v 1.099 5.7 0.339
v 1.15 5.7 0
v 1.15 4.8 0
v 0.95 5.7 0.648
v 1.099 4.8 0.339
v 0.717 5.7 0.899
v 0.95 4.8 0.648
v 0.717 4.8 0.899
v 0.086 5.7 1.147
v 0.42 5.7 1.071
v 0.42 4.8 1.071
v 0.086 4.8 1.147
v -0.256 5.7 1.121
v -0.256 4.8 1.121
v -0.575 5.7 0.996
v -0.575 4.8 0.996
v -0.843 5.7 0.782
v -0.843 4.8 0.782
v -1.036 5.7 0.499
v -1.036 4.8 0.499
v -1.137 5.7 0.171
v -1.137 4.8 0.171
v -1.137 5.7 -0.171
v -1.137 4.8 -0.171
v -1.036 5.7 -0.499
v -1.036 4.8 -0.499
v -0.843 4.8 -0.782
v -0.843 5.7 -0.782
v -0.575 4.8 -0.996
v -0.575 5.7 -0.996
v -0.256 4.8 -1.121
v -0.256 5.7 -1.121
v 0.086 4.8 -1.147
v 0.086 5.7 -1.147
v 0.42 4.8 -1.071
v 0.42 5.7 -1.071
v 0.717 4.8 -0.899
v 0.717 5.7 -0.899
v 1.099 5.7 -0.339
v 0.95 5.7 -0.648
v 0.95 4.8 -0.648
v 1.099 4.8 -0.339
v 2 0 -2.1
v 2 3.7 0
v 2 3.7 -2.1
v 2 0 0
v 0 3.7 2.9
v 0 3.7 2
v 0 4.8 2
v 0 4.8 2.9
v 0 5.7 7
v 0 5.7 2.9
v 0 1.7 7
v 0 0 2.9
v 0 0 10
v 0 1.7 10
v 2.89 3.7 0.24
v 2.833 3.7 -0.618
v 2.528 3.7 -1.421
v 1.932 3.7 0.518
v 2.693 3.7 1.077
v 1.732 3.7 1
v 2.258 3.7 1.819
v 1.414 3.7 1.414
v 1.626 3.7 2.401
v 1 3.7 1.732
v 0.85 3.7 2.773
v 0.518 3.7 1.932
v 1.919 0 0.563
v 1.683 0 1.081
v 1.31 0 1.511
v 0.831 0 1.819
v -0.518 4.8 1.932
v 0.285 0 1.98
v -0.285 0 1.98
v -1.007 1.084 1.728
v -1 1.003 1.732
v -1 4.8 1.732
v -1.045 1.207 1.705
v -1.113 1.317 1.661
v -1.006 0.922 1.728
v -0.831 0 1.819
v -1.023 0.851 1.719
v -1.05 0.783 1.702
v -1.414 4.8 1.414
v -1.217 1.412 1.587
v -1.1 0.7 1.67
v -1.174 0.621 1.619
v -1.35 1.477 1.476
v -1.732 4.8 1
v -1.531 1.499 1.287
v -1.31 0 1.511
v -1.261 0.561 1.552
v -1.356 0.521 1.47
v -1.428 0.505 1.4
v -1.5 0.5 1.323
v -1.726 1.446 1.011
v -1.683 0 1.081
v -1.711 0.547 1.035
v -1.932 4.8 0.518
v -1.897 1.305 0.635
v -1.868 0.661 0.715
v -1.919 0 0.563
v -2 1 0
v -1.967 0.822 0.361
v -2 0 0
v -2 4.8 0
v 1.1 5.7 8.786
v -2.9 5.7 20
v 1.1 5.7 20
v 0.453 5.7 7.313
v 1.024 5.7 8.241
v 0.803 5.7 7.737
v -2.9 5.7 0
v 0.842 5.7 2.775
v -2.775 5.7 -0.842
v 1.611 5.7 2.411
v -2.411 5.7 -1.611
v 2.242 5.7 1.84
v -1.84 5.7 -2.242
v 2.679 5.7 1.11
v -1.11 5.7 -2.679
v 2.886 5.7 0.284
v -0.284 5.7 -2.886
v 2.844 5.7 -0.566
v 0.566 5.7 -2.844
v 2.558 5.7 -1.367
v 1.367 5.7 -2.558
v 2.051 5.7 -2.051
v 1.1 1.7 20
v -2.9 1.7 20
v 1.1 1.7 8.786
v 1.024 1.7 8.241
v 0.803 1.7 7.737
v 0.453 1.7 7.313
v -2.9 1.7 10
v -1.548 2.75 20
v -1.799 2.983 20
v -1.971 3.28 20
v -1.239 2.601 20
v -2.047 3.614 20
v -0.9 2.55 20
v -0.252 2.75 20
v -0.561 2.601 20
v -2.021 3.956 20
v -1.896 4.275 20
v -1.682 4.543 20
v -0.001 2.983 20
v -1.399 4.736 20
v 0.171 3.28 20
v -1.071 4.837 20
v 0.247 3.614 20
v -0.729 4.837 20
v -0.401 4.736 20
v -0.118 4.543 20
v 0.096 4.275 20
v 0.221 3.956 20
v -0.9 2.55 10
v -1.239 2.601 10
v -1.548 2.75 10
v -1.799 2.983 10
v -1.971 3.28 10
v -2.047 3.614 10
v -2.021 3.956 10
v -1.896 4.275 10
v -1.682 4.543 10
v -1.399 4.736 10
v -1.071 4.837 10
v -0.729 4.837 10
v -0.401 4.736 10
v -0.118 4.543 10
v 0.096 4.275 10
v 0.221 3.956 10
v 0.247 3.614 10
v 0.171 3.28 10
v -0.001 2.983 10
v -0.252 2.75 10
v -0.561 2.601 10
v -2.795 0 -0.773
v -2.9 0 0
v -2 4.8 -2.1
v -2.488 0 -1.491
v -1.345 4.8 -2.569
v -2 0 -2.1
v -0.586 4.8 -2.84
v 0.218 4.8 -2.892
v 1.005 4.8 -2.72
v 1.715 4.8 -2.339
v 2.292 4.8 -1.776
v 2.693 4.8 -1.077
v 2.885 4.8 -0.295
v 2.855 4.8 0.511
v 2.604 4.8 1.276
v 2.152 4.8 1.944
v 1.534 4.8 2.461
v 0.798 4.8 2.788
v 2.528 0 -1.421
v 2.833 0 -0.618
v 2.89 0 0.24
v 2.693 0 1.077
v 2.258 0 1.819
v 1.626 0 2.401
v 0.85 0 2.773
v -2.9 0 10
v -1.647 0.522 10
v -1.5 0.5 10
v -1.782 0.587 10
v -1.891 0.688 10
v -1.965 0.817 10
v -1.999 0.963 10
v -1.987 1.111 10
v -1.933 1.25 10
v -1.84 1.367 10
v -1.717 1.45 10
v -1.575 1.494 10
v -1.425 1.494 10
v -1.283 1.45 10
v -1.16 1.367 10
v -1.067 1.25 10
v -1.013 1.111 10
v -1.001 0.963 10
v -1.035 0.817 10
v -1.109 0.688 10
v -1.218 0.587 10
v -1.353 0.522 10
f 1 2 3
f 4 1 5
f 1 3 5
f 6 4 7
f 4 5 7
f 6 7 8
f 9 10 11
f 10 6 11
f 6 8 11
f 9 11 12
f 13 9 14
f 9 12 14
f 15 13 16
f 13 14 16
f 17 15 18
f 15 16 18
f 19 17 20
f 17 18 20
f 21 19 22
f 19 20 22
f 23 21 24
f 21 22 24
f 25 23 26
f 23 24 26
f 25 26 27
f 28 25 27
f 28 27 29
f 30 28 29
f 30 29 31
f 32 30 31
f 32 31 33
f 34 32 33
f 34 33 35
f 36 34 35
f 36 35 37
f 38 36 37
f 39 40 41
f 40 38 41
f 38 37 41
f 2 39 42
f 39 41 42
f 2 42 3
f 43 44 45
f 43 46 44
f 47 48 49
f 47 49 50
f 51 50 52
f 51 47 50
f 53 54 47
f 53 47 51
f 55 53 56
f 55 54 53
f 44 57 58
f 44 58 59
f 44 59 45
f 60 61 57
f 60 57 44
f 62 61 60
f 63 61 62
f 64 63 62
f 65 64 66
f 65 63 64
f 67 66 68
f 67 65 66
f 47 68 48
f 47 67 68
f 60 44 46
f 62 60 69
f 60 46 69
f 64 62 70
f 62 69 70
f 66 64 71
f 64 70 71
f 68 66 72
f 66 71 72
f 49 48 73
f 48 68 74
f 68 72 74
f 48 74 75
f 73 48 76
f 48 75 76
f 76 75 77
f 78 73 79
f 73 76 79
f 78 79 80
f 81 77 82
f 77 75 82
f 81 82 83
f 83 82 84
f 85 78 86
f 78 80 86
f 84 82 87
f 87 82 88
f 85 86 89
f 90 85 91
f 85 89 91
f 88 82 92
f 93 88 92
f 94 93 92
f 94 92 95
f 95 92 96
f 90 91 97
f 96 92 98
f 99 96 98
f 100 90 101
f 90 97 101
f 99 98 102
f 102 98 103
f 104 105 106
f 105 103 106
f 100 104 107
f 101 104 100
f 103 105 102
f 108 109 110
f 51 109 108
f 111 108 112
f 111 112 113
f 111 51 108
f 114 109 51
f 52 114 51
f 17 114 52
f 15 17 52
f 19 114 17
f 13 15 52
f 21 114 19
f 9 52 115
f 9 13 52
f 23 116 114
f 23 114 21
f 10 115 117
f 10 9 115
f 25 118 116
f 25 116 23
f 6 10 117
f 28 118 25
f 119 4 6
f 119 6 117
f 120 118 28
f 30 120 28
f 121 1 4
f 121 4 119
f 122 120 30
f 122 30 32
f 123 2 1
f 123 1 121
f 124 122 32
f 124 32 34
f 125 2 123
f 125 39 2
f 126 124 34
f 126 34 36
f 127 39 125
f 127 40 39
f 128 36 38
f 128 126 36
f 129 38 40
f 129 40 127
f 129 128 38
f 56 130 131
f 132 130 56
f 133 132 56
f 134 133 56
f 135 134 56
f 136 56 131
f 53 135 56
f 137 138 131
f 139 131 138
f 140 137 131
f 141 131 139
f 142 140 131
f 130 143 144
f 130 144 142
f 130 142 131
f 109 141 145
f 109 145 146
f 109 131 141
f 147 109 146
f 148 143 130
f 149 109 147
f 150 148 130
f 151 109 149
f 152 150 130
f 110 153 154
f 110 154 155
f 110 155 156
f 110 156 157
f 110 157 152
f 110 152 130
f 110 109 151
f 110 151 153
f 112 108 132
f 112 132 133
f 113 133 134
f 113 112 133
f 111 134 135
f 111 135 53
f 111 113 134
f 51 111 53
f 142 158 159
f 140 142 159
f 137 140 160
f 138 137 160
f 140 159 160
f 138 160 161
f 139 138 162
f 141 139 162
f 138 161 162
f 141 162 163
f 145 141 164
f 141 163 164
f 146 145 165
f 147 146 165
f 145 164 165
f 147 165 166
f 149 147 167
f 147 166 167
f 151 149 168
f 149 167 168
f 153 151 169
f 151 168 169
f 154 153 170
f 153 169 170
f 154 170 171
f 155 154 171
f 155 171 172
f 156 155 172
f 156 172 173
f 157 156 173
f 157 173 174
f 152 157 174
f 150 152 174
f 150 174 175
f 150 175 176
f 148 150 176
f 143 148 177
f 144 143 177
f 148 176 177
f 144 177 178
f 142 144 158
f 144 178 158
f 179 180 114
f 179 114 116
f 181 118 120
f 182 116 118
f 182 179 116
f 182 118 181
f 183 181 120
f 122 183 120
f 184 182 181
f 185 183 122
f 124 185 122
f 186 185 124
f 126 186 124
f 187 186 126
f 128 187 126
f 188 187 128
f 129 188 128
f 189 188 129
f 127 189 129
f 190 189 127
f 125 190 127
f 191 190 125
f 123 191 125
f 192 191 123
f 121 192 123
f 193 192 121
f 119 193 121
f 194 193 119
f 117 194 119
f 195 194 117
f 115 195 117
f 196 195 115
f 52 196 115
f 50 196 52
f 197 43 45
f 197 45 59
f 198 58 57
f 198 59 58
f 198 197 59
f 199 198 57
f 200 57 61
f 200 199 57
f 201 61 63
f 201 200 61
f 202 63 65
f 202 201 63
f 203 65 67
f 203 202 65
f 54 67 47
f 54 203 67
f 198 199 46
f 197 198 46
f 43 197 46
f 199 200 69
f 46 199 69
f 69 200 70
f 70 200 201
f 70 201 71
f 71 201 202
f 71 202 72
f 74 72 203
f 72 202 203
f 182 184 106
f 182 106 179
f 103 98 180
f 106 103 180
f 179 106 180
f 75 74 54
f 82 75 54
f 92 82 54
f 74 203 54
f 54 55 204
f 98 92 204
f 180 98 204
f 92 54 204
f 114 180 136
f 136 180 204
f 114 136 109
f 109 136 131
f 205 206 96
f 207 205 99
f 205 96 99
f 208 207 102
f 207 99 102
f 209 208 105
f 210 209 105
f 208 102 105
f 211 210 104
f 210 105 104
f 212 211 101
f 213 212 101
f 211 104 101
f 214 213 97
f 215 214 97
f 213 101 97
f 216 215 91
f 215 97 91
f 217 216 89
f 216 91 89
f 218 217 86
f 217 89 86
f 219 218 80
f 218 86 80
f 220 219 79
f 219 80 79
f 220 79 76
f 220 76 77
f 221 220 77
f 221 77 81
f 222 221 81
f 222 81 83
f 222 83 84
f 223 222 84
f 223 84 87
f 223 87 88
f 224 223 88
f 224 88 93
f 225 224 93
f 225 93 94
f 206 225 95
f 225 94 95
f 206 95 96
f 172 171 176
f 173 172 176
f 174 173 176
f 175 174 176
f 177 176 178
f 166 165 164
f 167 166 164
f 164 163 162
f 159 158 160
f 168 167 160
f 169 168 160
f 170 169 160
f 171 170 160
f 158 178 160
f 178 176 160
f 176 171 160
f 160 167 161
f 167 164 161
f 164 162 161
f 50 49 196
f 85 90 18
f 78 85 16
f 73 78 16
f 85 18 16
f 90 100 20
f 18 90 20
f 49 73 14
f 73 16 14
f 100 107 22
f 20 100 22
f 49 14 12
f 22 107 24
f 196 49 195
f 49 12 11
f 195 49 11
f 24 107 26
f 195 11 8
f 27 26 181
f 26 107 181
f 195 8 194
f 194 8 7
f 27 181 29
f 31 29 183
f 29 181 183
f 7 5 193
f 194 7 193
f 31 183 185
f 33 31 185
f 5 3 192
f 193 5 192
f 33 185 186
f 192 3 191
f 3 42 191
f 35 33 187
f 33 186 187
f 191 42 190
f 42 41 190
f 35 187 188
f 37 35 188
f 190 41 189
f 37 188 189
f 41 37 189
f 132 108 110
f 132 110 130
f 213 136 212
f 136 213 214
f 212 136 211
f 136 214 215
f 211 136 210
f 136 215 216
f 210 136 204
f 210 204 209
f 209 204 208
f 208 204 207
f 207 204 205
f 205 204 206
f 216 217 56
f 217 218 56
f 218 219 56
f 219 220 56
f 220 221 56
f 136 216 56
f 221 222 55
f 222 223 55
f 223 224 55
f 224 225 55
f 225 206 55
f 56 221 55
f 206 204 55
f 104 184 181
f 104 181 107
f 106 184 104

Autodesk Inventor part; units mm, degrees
ref_plane "YZ Plane" through (0, 0, 0) normal (1, 0, 0) x (0, 1, 0)
ref_plane "XZ Plane" through (0, 0, 0) normal (0, 1, 0) x (-1, 0, 0)
ref_plane "XY Plane" through (0, 0, 0) normal (0, 0, 1) x (1, 0, 0)
sketch "スケッチ1" plane through (0, 0, 0) normal (0, 1, 0) x (-1, 0, 0)
  circle A0 centre (0, 0) radius 1.15
  circle A1 centre (0, 0) radius 2
  circle A2 centre (0, 0) radius 2.9
  line L0 (2, 0) -> (-2, 0)
  line L1 (-2, 0) -> (-2, -2.9)
  line L2 (-2, -2.9) -> (2, -2.9)
  line L3 (2, -2.9) -> (2, 0)
  line L4 (0, 0) -> (0, 2.9)
  line L5 (0, 0) -> (2.9, 0)
  line L6 (2.9, 0) -> (2.9, 10)
  line L7 (2.9, 10) -> (0, 10)
  line L8 (0, 10) -> (0, 0)
  point P0 (0, 2)
  point P1 (-2, -2.1)
  point P2 (2, -2.1)
  dimension "d1" = 4
  dimension "d2" = 5.8
  dimension "d0" = 2.3
  dimension "d3" = 10
extrude "押し出し1" add sketch "スケッチ1" along normal blind 3.7 contours A1 L1 A2 L4
extrude "押し出し2" add sketch "スケッチ1" along normal blind 4.8 contours L5 A2 L3 | A1 L4 A2 L5 | A2 L8 L7 L6
sketch "スケッチ2" plane through (0, 4.8, 0) normal (0, 1, 0) x (1, 0, 0)
  circle A0 centre (0, 0) radius 1.15
  circle A1 centre (0, 0) radius 2.0044
  circle A2 centre (0, 0) radius 2.9
  line L0 (2, 2.1) -> (2, 0) projected
  line L1 (2, 0) -> (-2.0044, 0)
  line L2 (-2.0044, 0) -> (-2.0044, 2.9)
  line L3 (-2.0044, 2.9) -> (2, 2.9)
  line L4 (2, 2.9) -> (2, 0)
  line L5 (0, -10) -> (0, -2) projected
  line L6 (-2.9, 0) -> (0, 0)
  line L7 (0, 0) -> (0, -10)
  line L8 (0, -10) -> (-2.9, -10)
  line L9 (-2.9, -10) -> (-2.9, 0)
  point P0 (0, -2.9)
  dimension "d8" = 2.3
extrude "押し出し3" add sketch "スケッチ2" along normal blind 0.9 contours L1 L0 A1 L5 L7 A0 | A0 L1 A1 L0 | A0 L7 L5 A1 L1 | L2 A2 L0 A1 | L6 A2 L2 | A1 L5 A2 L6 | L0 A2 L5 A1 | A2 L5 L8 L9
sketch "スケッチ3" plane through (-2.9, 0, 10) normal (0, 0, 1) x (1, 0, 0)
  line L0 (2.9, 0) -> (1.4, 0)
  line L1 (1.4, 0) -> (1.4, 1)
  line L2 (1.4, 1) -> (2.9, 1)
  line L3 (2.9, 1) -> (2.9, 0)
  dimension "d11" = 1.5
  dimension "d12" = 1
hole "穴1" at (-1.5, 1, 10) direction (0, 0, -1) diameter 1 depth 10
sketch "スケッチ4" plane through (-2.9, 0, 10) normal (0, 0, 1) x (1, 0, 0)
  line L0 (0, 0) -> (0, 5.7) projected
  line L1 (0, 5.7) -> (4, 5.7)
  line L2 (4, 5.7) -> (4, 1.7)
  line L3 (4, 1.7) -> (0, 1.7)
  line L4 (0, 1.7) -> (0, 5.7)
  point P0 (2.9, 0)
  dimension "d20" = 4
  dimension "d21" = 4
extrude "押し出し4" add sketch "スケッチ4" along normal blind 10 and the other way blind 3
fillet "フィレット1" radius 2 1 edges at (1.1, 3.7, 7)
sketch "スケッチ5" plane through (-2.9, 0, 20) normal (0, 0, 1) x (1, 0, 0)
  line L0 (5.8, 5.7) -> (0, 5.7) projected
  line L1 (0, 5.7) -> (2, 5.7)
  line L2 (2, 5.7) -> (2, 3.7)
  line L3 (2, 3.7) -> (0, 3.7)
  line L4 (0, 3.7) -> (0, 5.7)
  point P0 (2.9, 0)
  point P1 (2.9, 5.7)
  dimension "d27" = 2
  dimension "d28" = 2
hole "穴2" at (-0.9, 3.7, 20) direction (0, 0, -1) diameter 2.3 depth 10
properties part number "srod1.4left"
